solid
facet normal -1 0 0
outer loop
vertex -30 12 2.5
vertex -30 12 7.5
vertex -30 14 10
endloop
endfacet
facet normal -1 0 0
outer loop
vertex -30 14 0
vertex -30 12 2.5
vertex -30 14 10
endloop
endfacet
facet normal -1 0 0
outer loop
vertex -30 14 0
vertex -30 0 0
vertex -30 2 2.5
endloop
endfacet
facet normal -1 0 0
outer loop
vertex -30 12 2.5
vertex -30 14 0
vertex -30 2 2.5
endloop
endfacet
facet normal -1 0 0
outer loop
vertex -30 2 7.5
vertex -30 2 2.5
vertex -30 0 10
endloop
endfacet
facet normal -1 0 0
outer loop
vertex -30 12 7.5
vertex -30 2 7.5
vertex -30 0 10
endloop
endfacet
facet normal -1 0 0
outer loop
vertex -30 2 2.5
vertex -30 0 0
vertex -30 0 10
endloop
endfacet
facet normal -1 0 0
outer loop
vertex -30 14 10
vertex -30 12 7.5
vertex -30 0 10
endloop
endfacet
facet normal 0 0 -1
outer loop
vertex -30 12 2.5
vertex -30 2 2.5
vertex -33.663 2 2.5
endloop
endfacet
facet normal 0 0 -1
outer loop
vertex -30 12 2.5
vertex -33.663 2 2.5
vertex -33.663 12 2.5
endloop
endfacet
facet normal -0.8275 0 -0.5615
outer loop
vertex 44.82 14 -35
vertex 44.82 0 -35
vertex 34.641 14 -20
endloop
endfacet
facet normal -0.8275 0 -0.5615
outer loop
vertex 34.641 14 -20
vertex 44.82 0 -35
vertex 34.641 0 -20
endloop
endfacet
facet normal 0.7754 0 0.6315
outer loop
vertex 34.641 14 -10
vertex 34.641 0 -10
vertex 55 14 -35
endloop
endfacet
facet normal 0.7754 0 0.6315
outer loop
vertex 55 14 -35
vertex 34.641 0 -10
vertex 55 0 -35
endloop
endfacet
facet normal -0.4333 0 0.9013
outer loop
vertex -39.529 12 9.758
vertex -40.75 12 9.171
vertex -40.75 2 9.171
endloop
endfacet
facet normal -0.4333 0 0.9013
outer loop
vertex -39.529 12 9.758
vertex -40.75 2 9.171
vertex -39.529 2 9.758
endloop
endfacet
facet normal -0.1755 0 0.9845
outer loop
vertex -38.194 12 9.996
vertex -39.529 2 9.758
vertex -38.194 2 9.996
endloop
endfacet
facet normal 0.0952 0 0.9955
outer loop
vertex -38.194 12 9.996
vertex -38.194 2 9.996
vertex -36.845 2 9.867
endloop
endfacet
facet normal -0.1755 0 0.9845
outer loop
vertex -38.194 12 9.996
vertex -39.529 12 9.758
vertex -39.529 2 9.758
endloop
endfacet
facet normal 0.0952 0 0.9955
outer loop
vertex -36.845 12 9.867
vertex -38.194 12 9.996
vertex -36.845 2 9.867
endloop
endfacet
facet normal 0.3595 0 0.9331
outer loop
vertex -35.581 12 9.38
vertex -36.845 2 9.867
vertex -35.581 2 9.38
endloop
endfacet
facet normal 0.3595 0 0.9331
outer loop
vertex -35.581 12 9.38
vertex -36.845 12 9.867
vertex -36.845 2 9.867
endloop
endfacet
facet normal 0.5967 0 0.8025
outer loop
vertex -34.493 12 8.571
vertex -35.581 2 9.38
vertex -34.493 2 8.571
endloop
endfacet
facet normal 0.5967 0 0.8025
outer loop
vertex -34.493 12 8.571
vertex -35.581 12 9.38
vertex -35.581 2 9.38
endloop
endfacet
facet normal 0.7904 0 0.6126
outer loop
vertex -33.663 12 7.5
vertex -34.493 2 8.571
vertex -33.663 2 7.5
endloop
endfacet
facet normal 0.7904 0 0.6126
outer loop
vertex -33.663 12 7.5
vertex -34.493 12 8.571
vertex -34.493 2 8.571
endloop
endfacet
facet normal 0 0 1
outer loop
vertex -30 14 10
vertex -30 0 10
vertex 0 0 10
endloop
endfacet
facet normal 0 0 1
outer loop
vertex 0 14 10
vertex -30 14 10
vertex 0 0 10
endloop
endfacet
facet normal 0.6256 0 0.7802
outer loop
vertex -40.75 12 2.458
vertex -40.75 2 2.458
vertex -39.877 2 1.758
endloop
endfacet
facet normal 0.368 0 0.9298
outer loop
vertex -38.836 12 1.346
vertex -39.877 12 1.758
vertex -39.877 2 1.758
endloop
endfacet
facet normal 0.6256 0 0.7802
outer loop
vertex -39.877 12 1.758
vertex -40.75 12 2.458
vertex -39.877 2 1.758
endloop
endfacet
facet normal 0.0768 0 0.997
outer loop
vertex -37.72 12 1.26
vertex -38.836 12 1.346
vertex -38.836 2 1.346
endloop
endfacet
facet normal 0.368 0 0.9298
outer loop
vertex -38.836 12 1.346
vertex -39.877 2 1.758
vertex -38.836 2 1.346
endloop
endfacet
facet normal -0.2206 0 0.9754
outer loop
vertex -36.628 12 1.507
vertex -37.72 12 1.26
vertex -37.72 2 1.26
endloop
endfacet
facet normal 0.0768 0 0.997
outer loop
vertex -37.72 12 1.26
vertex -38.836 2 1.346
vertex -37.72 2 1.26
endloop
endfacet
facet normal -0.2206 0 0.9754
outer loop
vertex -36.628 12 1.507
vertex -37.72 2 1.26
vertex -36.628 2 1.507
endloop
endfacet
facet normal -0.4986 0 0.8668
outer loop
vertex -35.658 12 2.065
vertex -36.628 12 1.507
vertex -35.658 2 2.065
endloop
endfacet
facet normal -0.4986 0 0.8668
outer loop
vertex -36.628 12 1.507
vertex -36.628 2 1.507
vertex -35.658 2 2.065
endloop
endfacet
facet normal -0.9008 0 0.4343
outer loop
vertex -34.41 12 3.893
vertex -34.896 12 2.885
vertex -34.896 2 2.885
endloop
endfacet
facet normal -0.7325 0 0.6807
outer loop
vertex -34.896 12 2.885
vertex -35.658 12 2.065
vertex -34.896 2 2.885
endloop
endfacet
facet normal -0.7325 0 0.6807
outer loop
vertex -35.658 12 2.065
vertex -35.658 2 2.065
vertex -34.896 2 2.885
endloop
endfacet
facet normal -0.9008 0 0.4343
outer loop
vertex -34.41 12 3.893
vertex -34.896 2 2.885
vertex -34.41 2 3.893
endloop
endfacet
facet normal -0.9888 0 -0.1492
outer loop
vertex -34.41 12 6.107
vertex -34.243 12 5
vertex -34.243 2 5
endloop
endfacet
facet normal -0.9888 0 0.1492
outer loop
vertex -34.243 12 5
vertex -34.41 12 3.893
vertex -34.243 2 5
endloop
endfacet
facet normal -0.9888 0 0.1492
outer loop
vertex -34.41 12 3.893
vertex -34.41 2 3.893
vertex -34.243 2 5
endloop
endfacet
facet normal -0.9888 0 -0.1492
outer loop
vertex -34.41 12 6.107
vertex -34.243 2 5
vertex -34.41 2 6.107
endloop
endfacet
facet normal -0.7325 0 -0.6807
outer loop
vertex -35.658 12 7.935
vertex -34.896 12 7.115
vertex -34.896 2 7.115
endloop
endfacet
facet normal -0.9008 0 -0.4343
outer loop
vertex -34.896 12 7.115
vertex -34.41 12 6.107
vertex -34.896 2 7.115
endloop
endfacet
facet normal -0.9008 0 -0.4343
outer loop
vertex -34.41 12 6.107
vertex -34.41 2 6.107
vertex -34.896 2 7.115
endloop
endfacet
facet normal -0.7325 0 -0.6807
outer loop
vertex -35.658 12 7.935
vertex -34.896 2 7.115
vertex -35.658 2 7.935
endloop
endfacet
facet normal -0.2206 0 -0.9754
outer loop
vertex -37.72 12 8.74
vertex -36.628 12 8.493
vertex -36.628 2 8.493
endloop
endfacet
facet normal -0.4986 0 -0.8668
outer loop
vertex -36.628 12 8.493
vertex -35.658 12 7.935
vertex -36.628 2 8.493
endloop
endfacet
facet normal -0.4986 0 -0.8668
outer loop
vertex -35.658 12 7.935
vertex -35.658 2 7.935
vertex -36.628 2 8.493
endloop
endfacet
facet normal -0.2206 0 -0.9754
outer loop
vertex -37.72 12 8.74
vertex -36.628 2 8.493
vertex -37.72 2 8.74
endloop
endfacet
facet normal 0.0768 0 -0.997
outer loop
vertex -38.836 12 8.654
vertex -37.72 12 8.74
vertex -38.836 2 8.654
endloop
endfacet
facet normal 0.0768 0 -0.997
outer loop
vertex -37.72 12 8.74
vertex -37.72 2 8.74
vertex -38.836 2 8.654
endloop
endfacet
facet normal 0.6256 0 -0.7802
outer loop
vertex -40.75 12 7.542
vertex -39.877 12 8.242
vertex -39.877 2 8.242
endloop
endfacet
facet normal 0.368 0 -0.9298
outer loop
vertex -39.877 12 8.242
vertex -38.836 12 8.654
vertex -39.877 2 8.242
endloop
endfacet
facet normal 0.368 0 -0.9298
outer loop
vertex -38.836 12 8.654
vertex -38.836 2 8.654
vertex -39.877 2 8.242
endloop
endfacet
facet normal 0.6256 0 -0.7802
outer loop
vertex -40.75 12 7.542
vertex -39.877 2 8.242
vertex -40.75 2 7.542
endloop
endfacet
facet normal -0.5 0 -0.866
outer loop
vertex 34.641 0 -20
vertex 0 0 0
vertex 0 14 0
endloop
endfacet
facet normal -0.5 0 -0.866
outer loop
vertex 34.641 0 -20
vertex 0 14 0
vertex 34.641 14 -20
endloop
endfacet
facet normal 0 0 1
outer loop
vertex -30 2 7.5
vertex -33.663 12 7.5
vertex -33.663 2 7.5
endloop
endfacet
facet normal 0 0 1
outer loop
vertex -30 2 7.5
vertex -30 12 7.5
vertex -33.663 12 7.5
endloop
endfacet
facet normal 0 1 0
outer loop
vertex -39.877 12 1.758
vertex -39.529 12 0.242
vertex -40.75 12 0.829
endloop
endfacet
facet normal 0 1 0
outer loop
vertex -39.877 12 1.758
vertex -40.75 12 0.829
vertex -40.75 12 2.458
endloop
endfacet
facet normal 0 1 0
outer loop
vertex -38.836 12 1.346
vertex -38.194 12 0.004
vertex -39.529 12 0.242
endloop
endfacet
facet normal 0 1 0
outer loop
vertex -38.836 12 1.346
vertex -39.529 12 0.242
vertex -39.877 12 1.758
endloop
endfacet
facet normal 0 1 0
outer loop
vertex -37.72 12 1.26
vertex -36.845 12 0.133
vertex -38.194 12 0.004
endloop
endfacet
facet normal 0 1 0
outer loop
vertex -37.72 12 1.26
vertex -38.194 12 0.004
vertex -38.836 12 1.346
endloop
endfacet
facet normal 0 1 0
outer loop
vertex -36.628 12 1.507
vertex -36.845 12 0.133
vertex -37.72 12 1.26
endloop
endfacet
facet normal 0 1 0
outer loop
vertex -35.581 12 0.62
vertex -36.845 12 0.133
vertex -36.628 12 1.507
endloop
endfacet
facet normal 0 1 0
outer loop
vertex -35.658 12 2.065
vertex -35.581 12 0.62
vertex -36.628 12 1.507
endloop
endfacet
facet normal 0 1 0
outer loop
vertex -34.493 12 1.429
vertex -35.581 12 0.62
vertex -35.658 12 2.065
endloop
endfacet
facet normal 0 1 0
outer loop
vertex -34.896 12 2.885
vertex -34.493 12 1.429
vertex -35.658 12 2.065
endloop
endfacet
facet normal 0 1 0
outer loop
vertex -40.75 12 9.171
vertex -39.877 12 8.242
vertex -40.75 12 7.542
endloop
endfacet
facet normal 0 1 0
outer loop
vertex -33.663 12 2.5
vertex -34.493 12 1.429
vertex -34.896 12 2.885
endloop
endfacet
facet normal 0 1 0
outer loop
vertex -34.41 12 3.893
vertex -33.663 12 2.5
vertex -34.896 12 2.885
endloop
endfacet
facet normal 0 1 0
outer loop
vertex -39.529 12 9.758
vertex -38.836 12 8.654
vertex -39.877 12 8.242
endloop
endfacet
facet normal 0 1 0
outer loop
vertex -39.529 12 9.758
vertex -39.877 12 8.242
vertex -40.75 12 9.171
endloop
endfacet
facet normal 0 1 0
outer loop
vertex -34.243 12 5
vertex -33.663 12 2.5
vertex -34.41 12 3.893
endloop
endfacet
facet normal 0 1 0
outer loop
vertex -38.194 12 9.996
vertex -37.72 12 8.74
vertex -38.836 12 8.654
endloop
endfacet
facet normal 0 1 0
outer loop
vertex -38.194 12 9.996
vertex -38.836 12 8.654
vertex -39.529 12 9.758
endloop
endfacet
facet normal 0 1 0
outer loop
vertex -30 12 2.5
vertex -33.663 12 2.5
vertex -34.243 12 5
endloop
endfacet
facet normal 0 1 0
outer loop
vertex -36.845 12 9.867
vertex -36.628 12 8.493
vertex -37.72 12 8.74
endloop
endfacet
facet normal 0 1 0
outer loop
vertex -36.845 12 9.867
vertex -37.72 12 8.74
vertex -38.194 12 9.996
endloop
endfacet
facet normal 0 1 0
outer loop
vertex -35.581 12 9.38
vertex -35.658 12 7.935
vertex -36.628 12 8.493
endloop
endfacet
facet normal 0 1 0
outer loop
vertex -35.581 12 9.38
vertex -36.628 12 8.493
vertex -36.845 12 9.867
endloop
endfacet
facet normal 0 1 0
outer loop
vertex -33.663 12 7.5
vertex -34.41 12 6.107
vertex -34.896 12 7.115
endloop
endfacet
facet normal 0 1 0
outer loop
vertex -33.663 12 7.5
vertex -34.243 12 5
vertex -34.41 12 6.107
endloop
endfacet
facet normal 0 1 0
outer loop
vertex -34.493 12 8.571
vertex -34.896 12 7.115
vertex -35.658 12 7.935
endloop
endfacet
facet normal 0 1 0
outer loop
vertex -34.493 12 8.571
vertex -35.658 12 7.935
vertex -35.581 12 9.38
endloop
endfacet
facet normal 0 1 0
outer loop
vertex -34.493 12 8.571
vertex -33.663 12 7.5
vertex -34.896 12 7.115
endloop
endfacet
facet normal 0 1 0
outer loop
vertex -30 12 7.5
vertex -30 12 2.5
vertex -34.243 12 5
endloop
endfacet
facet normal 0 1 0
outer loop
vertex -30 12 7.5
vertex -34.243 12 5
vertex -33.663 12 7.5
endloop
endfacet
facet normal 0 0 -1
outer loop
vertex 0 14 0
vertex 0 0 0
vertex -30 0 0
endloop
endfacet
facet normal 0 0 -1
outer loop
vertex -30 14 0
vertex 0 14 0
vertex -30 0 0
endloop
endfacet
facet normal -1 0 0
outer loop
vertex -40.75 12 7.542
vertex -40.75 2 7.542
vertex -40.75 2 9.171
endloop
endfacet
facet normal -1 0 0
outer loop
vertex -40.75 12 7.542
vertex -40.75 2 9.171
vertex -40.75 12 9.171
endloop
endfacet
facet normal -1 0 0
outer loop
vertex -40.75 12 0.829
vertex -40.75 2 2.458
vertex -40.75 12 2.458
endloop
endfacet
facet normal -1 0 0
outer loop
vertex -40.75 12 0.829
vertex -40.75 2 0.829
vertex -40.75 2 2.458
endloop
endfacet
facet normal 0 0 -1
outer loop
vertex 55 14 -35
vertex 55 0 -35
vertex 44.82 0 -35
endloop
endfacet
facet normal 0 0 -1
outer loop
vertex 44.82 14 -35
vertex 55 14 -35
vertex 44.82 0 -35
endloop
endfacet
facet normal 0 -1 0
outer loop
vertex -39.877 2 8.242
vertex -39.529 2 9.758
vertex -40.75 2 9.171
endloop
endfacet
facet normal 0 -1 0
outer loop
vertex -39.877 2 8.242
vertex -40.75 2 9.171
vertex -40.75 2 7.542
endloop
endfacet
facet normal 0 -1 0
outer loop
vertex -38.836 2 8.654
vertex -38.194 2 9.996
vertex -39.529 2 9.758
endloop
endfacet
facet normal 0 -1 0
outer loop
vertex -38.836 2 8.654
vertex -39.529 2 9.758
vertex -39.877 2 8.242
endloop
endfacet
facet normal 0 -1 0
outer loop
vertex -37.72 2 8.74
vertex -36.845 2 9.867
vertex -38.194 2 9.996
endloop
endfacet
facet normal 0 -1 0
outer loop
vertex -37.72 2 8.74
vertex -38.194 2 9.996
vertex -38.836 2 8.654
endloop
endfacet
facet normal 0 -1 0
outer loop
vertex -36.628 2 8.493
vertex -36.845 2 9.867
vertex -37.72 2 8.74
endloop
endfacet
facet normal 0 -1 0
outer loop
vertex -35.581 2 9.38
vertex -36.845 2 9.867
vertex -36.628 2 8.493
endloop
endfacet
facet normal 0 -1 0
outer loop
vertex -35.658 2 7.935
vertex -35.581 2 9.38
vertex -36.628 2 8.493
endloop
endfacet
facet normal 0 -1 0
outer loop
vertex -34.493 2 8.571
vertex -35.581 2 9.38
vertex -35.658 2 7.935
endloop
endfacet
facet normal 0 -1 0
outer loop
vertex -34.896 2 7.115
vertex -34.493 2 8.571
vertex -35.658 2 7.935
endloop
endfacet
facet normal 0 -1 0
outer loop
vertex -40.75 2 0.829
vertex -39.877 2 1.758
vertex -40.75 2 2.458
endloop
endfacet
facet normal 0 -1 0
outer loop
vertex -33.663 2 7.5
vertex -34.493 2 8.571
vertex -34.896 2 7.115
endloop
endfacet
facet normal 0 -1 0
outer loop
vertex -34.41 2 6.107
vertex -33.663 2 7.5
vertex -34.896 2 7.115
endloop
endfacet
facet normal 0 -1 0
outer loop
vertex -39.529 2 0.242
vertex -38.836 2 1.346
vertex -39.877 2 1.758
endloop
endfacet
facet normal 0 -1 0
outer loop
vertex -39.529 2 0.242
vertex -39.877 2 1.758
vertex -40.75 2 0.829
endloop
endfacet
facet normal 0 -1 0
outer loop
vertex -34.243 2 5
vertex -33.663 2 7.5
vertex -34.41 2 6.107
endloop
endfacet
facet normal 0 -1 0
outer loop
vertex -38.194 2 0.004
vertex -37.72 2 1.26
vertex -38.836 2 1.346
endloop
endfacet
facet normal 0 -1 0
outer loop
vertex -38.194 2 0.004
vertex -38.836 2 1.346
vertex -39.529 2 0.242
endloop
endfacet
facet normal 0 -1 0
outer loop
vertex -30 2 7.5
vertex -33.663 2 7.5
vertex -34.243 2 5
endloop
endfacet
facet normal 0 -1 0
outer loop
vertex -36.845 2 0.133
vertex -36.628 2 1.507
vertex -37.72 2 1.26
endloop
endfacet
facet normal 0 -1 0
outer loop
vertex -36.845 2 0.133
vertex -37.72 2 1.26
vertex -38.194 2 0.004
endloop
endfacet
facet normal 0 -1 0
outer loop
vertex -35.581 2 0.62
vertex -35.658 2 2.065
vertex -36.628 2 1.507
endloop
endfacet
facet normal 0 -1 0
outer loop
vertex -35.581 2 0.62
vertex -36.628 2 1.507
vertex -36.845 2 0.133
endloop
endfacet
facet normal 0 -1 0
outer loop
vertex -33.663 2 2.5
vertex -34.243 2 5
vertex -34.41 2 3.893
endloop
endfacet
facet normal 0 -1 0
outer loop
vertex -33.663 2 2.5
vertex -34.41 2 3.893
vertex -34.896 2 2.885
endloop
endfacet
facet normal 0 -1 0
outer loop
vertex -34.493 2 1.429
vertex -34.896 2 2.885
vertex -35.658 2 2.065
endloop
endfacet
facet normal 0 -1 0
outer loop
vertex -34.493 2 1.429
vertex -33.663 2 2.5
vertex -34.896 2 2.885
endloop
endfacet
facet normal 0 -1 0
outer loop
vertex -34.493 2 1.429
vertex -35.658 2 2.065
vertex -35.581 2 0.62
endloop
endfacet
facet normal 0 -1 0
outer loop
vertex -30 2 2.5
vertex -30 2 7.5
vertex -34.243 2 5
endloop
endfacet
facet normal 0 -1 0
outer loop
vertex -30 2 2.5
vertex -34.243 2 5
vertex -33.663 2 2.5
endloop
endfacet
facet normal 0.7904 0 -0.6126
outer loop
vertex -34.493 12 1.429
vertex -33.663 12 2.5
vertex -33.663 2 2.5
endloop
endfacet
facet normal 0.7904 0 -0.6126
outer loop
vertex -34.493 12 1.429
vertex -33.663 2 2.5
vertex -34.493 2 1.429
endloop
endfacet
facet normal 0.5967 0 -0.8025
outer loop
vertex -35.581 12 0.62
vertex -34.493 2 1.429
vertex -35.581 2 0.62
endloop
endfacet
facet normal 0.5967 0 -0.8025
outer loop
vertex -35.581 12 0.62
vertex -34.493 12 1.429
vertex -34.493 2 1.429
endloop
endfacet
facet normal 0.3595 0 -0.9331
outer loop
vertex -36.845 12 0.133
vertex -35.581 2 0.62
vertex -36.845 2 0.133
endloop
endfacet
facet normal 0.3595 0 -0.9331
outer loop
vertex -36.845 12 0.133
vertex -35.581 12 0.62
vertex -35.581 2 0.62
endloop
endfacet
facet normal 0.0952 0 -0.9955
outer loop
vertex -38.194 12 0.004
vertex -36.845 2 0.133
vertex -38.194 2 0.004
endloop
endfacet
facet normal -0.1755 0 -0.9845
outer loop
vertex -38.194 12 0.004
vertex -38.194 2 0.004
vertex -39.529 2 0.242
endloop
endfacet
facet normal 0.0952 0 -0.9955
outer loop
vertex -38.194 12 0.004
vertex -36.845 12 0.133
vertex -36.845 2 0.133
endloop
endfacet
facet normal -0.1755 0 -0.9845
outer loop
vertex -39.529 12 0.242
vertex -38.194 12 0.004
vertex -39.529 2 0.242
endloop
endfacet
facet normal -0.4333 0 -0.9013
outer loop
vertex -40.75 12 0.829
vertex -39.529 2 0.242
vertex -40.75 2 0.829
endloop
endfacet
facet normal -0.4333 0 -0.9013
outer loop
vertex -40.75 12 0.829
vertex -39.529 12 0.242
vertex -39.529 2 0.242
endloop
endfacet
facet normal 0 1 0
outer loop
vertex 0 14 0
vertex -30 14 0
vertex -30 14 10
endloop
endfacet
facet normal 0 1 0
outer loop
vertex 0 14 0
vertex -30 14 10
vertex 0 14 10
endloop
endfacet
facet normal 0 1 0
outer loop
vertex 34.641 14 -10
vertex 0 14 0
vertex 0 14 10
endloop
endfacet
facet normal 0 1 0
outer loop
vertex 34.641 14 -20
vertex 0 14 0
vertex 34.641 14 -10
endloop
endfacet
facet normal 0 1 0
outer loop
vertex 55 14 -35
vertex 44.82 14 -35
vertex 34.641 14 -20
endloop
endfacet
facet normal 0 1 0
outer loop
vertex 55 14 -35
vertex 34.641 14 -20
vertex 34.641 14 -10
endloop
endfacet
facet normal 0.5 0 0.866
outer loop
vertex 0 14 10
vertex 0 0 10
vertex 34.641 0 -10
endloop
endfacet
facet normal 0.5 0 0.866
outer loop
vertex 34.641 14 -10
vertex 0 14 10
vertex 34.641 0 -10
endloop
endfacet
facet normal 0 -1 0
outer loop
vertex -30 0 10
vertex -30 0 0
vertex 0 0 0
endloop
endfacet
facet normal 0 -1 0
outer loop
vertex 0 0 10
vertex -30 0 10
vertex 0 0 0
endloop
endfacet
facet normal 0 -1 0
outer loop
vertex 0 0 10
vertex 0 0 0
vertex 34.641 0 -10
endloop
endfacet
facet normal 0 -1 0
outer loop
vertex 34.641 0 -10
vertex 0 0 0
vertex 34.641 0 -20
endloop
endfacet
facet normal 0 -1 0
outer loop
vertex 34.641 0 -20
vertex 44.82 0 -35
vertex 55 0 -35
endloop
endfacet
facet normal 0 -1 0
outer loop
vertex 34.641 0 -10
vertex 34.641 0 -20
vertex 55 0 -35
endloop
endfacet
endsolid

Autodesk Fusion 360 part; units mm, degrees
sketch "Sketch1" plane through (0, 0, 0) normal (0, 1, 0) x (1, 0, 0)
  line L0 (0, 0) -> (-30, 0)
  line L1 (-30, 0) -> (-30, -10)
  line L2 (-30, -10) -> (0, -10)
  line L3 (0, -10) -> (0, 0)
  line L4 (0, 0) -> (34.641, 20)
  line L5 (0, 0) -> (40, 0) construction
  line L6 (0, -10) -> (34.641, 10)
  line L7 (34.641, 10) -> (55, 35)
  line L8 (55, 35) -> (44.8205, 35)
  line L9 (44.8205, 35) -> (34.641, 20)
  dimension "d1" = 30
  dimension "d2" = 10
  dimension "d3" = 40
  dimension "d4" = 30
extrude "Extrude1" add sketch "Sketch1" along normal blind 14
sketch "Sketch2" plane through (-30, 0, 0) normal (-1, 0, 0) x (0, -1, 0)
  line L0 (0, 0) -> (0, 10)
  line L1 (0, 10) -> (-14, 10)
  line L2 (-14, 10) -> (-14, 0)
  line L3 (-14, 0) -> (0, 0)
sketch "Sketch3" plane through (-30, 0, 0) normal (-1, 0, 0) x (0, -1, 0)
  line L0 (-12, 7.5) -> (-2, 7.5)
  line L1 (-2, 7.5) -> (-2, 2.5)
  line L2 (-2, 2.5) -> (-12, 2.5)
  line L3 (-12, 2.5) -> (-12, 7.5)
  line L4 (-14, 10) -> (-14, 0)
  line L5 (0, 10) -> (-14, 10)
  dimension "d7" = 10
  dimension "d8" = 5
  dimension "d9" = 2
  dimension "d10" = 2.5
extrude "Extrude2" add sketch "Sketch3" along normal blind 5
cylinder "CylinderPrimitive1" add diameter 10 height -10 placed x (1, 0, 0) y (0, 0, -1) z (0, 1, 0) at (-37.9928, 12, 5)
sketch "Sketch5" plane through (0, 2, 0) normal (0, -1, 0) x (1, 0, 0)
  arc A0 (-33.6627, 7.5) -> (-33.6627, 2.5) centre (-37.9928, 5) ccw
  line L0 (-33.6627, 2.5) -> (-30, 2.5)
  line L1 (-30, 2.5) -> (-30, 7.5)
  line L2 (-30, 7.5) -> (-33.6627, 7.5)
  circle A1 centre (-37.9928, 5) radius 3.75
  dimension "d15" = 7.5
extrude "Extrude3" cut sketch "Sketch5" against normal blind 35 contours A1
ref_plane "WorkPlane1" through (-45, 7, 5) normal (-1, 0, 0) x (0, -1, 0)
sketch "Sketch6" plane through (-45, 7, 5) normal (-1, 0, 0) x (0, 1, 0)
  line L0 (13.2157, -10.5168) -> (-13.0296, -10.5168)
  line L1 (-13.0296, -10.5168) -> (-13.0296, 7.5386)
  line L2 (-13.0296, 7.5386) -> (13.2157, 7.5386)
  line L3 (13.2157, 7.5386) -> (13.2157, -10.5168)
extrude "Extrude4" cut sketch "Sketch6" against normal blind 4.25
sketch "Sketch7" plane through (0, 2, 0) normal (0, -1, 0) x (1, 0, 0)
  line L0 (-40.75, 2.4583) -> (-40.75, 0.8289)
  arc A0 (-40.75, 0.8289) -> (-33.6627, 2.5) centre (-37.9928, 5) ccw
  line L1 (-33.6627, 2.5) -> (-30, 2.5)
  line L2 (-30, 2.5) -> (-30, 7.5)
  line L3 (-30, 7.5) -> (-33.6627, 7.5)
  arc A1 (-33.6627, 7.5) -> (-40.75, 9.1711) centre (-37.9928, 5) ccw
  line L4 (-40.75, 9.1711) -> (-40.75, 7.5417)
  arc A2 (-40.75, 2.4583) -> (-40.75, 7.5417) centre (-37.9928, 5) ccw
